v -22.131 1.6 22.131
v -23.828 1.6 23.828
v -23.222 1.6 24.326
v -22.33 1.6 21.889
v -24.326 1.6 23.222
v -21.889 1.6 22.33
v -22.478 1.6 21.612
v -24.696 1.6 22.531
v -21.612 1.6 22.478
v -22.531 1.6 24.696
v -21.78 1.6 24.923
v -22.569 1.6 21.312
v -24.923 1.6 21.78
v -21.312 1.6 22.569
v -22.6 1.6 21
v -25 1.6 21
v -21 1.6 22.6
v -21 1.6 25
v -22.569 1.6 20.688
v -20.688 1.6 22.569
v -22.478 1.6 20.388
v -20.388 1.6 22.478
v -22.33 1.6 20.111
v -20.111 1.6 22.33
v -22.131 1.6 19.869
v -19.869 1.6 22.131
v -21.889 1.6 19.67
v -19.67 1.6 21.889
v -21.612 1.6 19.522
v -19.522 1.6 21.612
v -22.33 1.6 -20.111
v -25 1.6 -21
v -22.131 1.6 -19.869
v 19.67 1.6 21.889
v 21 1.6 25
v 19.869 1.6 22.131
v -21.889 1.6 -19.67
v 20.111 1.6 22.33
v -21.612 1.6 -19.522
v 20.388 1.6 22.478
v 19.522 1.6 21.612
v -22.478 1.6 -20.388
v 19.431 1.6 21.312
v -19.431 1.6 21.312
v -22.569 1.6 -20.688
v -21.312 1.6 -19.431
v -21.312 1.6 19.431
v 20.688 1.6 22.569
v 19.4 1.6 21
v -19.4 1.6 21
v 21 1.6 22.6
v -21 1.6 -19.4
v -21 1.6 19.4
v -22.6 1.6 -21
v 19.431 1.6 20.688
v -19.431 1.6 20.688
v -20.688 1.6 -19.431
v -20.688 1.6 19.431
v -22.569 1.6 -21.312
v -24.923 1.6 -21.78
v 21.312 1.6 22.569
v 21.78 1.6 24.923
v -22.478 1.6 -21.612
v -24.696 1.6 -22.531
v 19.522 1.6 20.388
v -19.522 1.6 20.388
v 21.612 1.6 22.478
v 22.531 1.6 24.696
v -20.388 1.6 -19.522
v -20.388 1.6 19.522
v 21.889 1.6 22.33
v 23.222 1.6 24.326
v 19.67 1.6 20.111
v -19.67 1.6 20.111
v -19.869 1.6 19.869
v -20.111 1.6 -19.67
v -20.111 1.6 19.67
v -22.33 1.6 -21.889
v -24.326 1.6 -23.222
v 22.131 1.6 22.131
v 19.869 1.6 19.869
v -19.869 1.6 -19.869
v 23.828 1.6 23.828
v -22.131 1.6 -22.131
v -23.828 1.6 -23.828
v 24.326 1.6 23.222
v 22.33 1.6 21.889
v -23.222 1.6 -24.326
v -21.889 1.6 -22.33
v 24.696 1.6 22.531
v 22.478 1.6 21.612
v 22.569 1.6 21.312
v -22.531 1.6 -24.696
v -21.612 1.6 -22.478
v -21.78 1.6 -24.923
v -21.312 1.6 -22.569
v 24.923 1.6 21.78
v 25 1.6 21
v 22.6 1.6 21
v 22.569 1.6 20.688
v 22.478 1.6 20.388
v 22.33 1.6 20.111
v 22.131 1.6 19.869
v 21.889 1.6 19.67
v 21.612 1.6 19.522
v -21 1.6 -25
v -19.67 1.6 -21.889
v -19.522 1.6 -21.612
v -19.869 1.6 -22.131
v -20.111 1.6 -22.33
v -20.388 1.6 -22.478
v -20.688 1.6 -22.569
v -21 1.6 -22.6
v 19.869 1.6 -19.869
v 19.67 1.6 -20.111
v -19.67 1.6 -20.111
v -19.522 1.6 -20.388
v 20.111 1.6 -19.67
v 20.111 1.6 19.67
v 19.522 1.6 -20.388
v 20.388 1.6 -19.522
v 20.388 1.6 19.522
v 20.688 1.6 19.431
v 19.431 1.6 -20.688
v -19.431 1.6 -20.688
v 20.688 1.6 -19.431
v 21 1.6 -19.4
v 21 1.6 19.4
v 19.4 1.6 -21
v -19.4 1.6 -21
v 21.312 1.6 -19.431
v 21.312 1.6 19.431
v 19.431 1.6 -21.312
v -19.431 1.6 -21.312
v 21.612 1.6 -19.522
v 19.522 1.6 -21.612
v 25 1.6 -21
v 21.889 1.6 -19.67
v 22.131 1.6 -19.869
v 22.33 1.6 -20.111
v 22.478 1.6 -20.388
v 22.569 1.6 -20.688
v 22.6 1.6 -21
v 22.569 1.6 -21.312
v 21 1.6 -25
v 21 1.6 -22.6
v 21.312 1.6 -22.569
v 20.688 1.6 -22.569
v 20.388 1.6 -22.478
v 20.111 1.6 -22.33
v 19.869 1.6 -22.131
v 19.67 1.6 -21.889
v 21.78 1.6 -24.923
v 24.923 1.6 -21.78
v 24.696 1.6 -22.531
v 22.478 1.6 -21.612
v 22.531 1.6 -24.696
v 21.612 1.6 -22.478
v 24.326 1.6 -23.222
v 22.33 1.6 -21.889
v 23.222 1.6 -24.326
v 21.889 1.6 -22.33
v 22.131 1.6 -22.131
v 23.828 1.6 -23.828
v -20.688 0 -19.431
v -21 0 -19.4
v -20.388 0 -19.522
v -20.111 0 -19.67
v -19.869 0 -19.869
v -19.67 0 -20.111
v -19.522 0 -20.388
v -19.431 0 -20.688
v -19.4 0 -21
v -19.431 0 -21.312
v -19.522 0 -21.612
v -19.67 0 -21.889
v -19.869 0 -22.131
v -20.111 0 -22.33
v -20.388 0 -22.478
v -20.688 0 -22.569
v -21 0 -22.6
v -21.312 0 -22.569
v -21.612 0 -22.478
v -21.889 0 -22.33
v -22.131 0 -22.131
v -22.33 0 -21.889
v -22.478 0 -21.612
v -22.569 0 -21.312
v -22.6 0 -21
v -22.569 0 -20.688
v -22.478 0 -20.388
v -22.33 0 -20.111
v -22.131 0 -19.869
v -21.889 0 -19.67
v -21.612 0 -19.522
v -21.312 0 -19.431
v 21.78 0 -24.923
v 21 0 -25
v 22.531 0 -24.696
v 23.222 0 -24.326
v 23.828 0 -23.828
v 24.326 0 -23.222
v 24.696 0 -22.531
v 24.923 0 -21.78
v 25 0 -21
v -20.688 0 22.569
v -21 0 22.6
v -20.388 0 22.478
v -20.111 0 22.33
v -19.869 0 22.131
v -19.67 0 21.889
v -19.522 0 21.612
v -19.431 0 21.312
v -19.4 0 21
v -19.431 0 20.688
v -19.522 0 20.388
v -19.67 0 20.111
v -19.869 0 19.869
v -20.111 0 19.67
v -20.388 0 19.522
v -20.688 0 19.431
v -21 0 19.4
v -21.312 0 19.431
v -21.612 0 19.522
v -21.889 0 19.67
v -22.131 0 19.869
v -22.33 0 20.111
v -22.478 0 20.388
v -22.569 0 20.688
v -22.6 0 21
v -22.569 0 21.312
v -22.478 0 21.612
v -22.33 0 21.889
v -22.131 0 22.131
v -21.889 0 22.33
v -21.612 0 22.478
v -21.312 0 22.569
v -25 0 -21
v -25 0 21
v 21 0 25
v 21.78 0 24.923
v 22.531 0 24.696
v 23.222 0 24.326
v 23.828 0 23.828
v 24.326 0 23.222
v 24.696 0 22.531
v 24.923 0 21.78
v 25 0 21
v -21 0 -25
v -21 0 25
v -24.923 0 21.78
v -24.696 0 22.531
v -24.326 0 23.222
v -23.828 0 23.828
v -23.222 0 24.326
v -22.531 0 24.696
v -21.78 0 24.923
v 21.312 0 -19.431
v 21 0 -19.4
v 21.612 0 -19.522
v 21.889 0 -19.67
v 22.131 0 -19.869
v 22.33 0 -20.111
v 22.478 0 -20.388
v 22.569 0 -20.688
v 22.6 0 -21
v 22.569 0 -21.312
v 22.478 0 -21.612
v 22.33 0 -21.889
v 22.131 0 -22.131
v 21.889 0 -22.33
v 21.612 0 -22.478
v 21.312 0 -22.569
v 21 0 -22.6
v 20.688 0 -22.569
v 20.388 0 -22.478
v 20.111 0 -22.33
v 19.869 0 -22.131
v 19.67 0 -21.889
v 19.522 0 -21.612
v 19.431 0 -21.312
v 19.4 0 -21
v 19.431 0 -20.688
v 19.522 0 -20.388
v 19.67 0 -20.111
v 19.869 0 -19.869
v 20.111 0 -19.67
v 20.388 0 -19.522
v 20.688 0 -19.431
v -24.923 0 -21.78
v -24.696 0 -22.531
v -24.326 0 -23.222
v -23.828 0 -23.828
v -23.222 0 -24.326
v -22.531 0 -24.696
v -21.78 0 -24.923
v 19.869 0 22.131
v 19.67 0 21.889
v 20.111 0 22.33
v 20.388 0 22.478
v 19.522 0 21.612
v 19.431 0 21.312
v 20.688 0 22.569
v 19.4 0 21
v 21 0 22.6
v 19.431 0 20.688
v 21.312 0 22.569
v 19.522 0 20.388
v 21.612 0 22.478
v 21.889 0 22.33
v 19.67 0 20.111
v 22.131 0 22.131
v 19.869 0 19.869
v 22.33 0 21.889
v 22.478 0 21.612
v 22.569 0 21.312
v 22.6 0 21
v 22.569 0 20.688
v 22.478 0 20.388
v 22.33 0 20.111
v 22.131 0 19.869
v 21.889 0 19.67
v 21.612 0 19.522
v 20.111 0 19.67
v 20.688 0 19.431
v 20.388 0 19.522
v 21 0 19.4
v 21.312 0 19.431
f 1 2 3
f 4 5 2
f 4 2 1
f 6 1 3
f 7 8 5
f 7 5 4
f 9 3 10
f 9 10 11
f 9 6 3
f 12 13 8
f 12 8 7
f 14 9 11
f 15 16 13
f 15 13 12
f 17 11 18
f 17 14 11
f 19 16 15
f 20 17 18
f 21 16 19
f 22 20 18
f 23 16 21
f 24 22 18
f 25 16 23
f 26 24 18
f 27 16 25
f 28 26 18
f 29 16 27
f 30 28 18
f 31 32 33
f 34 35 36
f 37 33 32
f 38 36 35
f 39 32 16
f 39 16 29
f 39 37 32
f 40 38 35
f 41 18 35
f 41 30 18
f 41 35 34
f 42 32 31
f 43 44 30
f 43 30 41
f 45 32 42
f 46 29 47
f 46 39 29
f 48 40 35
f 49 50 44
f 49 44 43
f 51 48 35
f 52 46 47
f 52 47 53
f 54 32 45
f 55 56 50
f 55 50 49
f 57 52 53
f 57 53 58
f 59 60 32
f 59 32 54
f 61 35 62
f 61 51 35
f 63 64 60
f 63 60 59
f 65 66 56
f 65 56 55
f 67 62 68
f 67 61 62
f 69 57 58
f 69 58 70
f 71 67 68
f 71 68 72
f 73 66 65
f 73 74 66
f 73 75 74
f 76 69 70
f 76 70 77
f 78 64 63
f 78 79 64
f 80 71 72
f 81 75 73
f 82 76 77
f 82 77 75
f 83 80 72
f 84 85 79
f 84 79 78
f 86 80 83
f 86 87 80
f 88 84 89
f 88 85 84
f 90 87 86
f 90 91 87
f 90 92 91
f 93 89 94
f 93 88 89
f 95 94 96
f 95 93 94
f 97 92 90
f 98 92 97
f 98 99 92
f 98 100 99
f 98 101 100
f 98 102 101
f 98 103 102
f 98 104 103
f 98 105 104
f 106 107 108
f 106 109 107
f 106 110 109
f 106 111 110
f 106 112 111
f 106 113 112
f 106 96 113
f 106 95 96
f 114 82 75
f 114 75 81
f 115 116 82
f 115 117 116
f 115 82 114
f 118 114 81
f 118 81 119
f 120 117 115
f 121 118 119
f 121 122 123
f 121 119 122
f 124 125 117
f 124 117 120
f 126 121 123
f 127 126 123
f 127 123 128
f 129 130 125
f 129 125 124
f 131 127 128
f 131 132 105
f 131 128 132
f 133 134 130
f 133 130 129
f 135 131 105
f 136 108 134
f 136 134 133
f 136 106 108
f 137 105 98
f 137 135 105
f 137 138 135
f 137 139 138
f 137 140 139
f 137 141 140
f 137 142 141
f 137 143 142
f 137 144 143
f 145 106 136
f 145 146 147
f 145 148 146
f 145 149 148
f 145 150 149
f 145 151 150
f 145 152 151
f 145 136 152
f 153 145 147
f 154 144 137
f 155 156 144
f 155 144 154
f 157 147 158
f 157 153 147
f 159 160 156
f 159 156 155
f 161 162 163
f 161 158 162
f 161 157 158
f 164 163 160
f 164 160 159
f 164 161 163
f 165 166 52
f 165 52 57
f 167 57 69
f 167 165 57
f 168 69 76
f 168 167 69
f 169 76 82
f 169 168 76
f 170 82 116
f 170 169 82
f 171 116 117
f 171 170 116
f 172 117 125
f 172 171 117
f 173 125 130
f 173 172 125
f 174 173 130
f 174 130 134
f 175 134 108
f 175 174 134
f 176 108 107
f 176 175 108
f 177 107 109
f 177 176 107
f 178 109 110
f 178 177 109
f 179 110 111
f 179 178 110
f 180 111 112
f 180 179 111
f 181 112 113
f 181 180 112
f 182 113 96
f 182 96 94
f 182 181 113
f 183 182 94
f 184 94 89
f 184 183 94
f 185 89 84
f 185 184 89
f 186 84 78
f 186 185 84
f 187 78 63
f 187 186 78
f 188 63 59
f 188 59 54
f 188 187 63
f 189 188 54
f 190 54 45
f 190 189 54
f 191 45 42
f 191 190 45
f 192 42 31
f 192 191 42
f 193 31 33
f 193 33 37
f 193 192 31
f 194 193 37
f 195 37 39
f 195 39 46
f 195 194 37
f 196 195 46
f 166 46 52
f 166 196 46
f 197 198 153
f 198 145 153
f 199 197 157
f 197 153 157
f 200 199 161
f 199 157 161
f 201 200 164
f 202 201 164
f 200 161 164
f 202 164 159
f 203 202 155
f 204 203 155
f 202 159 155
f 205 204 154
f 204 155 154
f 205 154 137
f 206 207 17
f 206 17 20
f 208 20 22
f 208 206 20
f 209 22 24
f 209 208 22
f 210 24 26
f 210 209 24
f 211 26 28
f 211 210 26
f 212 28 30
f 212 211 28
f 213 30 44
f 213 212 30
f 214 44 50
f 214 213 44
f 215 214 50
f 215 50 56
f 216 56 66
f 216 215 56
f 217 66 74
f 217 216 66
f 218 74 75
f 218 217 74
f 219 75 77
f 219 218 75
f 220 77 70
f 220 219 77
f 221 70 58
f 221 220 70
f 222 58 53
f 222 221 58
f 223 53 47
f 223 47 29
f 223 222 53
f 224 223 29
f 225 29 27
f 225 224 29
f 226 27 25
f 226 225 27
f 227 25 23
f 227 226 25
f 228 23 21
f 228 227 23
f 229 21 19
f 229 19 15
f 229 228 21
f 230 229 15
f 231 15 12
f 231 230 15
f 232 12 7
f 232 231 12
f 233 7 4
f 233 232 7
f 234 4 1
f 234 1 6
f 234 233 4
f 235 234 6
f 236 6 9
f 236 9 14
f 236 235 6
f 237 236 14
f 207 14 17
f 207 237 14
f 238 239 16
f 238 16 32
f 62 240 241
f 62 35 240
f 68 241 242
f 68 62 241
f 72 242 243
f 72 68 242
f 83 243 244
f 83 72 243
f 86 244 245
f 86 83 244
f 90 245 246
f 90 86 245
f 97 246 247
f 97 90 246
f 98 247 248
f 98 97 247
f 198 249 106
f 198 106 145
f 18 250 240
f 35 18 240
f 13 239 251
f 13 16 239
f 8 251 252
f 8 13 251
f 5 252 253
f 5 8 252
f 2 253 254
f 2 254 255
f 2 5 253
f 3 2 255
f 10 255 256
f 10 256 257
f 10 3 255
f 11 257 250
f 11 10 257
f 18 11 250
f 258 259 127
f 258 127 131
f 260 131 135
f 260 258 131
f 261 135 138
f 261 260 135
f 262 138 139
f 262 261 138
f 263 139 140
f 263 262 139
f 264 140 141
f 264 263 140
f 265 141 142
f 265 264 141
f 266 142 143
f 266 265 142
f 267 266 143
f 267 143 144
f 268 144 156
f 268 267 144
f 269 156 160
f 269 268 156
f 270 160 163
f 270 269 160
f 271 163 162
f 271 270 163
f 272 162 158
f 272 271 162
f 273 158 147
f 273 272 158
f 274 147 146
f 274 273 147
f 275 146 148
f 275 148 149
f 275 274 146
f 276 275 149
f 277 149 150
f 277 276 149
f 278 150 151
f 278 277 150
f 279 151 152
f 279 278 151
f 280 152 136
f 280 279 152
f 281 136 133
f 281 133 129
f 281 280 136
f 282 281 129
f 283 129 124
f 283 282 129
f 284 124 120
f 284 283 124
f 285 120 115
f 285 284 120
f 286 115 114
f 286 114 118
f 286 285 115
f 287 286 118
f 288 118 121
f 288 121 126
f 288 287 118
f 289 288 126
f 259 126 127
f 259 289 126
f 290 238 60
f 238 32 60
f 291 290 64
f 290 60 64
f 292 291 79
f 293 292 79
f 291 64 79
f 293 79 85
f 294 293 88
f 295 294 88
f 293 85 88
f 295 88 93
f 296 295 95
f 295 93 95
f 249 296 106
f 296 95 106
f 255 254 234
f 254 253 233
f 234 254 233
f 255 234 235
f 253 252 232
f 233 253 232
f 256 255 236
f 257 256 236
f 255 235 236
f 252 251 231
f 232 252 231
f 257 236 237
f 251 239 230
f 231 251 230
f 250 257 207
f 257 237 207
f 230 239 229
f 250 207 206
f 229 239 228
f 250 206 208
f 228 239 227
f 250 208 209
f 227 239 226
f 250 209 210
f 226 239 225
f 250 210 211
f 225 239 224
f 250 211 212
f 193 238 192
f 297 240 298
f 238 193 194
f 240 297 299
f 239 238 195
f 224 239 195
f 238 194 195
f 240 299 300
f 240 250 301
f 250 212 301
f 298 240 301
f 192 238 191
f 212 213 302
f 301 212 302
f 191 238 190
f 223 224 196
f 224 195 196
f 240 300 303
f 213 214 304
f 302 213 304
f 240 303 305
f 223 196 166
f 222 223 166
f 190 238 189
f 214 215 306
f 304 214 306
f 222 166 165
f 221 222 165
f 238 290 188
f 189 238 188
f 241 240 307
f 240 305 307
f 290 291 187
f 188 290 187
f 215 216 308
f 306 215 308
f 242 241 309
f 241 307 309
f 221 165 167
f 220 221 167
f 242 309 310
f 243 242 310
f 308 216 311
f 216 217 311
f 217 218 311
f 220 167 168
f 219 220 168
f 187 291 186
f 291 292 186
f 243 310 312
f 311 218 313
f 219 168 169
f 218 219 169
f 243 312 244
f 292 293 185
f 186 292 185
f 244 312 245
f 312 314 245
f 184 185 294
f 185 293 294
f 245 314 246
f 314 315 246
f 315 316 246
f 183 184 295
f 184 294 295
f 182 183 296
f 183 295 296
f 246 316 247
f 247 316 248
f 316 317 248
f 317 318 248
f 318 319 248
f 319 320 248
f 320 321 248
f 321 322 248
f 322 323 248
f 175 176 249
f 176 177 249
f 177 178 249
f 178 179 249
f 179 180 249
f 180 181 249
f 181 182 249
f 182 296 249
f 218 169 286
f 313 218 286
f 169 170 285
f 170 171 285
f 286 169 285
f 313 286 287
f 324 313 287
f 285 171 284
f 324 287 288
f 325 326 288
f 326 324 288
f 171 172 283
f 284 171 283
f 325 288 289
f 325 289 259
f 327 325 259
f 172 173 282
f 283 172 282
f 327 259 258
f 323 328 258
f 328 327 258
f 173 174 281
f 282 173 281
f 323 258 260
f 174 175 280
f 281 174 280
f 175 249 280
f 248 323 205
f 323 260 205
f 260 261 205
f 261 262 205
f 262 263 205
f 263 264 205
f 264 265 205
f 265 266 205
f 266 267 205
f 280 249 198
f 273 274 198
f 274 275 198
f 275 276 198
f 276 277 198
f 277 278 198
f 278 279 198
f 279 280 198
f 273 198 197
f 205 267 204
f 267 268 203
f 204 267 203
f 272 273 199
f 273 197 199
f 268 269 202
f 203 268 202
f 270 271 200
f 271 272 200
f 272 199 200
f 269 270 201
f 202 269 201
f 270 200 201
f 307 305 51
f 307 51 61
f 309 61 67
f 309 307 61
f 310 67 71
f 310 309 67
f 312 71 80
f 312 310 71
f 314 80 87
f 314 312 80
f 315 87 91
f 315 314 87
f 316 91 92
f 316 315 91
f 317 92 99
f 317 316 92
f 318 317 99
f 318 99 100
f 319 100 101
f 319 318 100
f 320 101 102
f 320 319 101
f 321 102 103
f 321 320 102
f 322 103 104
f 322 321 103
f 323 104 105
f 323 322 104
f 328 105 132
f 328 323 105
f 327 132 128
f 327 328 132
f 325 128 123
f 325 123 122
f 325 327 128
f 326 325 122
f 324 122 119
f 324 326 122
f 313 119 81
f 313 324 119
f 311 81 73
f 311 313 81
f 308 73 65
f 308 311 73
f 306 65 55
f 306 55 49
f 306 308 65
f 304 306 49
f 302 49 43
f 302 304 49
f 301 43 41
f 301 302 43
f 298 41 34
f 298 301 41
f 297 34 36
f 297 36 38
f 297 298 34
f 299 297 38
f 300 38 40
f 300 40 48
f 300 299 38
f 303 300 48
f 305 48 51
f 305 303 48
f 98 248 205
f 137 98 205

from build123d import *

# Parameters (mm, degrees)
ESBO_O1_W                = 50
ESBO_O1_H                = 50
ESBO_O1_R                = 1.6
RESSALTO_EXTRUS_O1_DEPTH = 1.6
FILETE1_R                = 4


with BuildPart() as part:
    # Esboço1 → Ressalto-extrusão1 (new body)
    with BuildSketch(Plane(origin=(0, 0, 0), x_dir=(1, 0, 0), z_dir=(0, 1, 0))):
        Rectangle(ESBO_O1_W, ESBO_O1_H)
        with Locations(Location((21, -21, 0), (0, 0, 270))):
            Circle(ESBO_O1_R, mode=Mode.SUBTRACT)
        with Locations(Location((21, 21, 0), (0, 0, 270))):
            Circle(ESBO_O1_R, mode=Mode.SUBTRACT)
        with Locations(Location((-21, 21, 0), (0, 0, 270))):
            Circle(ESBO_O1_R, mode=Mode.SUBTRACT)
        with Locations(Location((-21, -21, 0), (0, 0, 270))):
            Circle(ESBO_O1_R, mode=Mode.SUBTRACT)
    extrude(amount=RESSALTO_EXTRUS_O1_DEPTH)

    # Filete1
    filete1_edges = [part.edges().sort_by_distance(p)[0] for p in [
        (25, 0.8, 25),
        (-25, 0.8, 25),
        (-25, 0.8, -25),
        (25, 0.8, -25),
    ]]
    fillet(filete1_edges, radius=FILETE1_R)


solid = part.part
